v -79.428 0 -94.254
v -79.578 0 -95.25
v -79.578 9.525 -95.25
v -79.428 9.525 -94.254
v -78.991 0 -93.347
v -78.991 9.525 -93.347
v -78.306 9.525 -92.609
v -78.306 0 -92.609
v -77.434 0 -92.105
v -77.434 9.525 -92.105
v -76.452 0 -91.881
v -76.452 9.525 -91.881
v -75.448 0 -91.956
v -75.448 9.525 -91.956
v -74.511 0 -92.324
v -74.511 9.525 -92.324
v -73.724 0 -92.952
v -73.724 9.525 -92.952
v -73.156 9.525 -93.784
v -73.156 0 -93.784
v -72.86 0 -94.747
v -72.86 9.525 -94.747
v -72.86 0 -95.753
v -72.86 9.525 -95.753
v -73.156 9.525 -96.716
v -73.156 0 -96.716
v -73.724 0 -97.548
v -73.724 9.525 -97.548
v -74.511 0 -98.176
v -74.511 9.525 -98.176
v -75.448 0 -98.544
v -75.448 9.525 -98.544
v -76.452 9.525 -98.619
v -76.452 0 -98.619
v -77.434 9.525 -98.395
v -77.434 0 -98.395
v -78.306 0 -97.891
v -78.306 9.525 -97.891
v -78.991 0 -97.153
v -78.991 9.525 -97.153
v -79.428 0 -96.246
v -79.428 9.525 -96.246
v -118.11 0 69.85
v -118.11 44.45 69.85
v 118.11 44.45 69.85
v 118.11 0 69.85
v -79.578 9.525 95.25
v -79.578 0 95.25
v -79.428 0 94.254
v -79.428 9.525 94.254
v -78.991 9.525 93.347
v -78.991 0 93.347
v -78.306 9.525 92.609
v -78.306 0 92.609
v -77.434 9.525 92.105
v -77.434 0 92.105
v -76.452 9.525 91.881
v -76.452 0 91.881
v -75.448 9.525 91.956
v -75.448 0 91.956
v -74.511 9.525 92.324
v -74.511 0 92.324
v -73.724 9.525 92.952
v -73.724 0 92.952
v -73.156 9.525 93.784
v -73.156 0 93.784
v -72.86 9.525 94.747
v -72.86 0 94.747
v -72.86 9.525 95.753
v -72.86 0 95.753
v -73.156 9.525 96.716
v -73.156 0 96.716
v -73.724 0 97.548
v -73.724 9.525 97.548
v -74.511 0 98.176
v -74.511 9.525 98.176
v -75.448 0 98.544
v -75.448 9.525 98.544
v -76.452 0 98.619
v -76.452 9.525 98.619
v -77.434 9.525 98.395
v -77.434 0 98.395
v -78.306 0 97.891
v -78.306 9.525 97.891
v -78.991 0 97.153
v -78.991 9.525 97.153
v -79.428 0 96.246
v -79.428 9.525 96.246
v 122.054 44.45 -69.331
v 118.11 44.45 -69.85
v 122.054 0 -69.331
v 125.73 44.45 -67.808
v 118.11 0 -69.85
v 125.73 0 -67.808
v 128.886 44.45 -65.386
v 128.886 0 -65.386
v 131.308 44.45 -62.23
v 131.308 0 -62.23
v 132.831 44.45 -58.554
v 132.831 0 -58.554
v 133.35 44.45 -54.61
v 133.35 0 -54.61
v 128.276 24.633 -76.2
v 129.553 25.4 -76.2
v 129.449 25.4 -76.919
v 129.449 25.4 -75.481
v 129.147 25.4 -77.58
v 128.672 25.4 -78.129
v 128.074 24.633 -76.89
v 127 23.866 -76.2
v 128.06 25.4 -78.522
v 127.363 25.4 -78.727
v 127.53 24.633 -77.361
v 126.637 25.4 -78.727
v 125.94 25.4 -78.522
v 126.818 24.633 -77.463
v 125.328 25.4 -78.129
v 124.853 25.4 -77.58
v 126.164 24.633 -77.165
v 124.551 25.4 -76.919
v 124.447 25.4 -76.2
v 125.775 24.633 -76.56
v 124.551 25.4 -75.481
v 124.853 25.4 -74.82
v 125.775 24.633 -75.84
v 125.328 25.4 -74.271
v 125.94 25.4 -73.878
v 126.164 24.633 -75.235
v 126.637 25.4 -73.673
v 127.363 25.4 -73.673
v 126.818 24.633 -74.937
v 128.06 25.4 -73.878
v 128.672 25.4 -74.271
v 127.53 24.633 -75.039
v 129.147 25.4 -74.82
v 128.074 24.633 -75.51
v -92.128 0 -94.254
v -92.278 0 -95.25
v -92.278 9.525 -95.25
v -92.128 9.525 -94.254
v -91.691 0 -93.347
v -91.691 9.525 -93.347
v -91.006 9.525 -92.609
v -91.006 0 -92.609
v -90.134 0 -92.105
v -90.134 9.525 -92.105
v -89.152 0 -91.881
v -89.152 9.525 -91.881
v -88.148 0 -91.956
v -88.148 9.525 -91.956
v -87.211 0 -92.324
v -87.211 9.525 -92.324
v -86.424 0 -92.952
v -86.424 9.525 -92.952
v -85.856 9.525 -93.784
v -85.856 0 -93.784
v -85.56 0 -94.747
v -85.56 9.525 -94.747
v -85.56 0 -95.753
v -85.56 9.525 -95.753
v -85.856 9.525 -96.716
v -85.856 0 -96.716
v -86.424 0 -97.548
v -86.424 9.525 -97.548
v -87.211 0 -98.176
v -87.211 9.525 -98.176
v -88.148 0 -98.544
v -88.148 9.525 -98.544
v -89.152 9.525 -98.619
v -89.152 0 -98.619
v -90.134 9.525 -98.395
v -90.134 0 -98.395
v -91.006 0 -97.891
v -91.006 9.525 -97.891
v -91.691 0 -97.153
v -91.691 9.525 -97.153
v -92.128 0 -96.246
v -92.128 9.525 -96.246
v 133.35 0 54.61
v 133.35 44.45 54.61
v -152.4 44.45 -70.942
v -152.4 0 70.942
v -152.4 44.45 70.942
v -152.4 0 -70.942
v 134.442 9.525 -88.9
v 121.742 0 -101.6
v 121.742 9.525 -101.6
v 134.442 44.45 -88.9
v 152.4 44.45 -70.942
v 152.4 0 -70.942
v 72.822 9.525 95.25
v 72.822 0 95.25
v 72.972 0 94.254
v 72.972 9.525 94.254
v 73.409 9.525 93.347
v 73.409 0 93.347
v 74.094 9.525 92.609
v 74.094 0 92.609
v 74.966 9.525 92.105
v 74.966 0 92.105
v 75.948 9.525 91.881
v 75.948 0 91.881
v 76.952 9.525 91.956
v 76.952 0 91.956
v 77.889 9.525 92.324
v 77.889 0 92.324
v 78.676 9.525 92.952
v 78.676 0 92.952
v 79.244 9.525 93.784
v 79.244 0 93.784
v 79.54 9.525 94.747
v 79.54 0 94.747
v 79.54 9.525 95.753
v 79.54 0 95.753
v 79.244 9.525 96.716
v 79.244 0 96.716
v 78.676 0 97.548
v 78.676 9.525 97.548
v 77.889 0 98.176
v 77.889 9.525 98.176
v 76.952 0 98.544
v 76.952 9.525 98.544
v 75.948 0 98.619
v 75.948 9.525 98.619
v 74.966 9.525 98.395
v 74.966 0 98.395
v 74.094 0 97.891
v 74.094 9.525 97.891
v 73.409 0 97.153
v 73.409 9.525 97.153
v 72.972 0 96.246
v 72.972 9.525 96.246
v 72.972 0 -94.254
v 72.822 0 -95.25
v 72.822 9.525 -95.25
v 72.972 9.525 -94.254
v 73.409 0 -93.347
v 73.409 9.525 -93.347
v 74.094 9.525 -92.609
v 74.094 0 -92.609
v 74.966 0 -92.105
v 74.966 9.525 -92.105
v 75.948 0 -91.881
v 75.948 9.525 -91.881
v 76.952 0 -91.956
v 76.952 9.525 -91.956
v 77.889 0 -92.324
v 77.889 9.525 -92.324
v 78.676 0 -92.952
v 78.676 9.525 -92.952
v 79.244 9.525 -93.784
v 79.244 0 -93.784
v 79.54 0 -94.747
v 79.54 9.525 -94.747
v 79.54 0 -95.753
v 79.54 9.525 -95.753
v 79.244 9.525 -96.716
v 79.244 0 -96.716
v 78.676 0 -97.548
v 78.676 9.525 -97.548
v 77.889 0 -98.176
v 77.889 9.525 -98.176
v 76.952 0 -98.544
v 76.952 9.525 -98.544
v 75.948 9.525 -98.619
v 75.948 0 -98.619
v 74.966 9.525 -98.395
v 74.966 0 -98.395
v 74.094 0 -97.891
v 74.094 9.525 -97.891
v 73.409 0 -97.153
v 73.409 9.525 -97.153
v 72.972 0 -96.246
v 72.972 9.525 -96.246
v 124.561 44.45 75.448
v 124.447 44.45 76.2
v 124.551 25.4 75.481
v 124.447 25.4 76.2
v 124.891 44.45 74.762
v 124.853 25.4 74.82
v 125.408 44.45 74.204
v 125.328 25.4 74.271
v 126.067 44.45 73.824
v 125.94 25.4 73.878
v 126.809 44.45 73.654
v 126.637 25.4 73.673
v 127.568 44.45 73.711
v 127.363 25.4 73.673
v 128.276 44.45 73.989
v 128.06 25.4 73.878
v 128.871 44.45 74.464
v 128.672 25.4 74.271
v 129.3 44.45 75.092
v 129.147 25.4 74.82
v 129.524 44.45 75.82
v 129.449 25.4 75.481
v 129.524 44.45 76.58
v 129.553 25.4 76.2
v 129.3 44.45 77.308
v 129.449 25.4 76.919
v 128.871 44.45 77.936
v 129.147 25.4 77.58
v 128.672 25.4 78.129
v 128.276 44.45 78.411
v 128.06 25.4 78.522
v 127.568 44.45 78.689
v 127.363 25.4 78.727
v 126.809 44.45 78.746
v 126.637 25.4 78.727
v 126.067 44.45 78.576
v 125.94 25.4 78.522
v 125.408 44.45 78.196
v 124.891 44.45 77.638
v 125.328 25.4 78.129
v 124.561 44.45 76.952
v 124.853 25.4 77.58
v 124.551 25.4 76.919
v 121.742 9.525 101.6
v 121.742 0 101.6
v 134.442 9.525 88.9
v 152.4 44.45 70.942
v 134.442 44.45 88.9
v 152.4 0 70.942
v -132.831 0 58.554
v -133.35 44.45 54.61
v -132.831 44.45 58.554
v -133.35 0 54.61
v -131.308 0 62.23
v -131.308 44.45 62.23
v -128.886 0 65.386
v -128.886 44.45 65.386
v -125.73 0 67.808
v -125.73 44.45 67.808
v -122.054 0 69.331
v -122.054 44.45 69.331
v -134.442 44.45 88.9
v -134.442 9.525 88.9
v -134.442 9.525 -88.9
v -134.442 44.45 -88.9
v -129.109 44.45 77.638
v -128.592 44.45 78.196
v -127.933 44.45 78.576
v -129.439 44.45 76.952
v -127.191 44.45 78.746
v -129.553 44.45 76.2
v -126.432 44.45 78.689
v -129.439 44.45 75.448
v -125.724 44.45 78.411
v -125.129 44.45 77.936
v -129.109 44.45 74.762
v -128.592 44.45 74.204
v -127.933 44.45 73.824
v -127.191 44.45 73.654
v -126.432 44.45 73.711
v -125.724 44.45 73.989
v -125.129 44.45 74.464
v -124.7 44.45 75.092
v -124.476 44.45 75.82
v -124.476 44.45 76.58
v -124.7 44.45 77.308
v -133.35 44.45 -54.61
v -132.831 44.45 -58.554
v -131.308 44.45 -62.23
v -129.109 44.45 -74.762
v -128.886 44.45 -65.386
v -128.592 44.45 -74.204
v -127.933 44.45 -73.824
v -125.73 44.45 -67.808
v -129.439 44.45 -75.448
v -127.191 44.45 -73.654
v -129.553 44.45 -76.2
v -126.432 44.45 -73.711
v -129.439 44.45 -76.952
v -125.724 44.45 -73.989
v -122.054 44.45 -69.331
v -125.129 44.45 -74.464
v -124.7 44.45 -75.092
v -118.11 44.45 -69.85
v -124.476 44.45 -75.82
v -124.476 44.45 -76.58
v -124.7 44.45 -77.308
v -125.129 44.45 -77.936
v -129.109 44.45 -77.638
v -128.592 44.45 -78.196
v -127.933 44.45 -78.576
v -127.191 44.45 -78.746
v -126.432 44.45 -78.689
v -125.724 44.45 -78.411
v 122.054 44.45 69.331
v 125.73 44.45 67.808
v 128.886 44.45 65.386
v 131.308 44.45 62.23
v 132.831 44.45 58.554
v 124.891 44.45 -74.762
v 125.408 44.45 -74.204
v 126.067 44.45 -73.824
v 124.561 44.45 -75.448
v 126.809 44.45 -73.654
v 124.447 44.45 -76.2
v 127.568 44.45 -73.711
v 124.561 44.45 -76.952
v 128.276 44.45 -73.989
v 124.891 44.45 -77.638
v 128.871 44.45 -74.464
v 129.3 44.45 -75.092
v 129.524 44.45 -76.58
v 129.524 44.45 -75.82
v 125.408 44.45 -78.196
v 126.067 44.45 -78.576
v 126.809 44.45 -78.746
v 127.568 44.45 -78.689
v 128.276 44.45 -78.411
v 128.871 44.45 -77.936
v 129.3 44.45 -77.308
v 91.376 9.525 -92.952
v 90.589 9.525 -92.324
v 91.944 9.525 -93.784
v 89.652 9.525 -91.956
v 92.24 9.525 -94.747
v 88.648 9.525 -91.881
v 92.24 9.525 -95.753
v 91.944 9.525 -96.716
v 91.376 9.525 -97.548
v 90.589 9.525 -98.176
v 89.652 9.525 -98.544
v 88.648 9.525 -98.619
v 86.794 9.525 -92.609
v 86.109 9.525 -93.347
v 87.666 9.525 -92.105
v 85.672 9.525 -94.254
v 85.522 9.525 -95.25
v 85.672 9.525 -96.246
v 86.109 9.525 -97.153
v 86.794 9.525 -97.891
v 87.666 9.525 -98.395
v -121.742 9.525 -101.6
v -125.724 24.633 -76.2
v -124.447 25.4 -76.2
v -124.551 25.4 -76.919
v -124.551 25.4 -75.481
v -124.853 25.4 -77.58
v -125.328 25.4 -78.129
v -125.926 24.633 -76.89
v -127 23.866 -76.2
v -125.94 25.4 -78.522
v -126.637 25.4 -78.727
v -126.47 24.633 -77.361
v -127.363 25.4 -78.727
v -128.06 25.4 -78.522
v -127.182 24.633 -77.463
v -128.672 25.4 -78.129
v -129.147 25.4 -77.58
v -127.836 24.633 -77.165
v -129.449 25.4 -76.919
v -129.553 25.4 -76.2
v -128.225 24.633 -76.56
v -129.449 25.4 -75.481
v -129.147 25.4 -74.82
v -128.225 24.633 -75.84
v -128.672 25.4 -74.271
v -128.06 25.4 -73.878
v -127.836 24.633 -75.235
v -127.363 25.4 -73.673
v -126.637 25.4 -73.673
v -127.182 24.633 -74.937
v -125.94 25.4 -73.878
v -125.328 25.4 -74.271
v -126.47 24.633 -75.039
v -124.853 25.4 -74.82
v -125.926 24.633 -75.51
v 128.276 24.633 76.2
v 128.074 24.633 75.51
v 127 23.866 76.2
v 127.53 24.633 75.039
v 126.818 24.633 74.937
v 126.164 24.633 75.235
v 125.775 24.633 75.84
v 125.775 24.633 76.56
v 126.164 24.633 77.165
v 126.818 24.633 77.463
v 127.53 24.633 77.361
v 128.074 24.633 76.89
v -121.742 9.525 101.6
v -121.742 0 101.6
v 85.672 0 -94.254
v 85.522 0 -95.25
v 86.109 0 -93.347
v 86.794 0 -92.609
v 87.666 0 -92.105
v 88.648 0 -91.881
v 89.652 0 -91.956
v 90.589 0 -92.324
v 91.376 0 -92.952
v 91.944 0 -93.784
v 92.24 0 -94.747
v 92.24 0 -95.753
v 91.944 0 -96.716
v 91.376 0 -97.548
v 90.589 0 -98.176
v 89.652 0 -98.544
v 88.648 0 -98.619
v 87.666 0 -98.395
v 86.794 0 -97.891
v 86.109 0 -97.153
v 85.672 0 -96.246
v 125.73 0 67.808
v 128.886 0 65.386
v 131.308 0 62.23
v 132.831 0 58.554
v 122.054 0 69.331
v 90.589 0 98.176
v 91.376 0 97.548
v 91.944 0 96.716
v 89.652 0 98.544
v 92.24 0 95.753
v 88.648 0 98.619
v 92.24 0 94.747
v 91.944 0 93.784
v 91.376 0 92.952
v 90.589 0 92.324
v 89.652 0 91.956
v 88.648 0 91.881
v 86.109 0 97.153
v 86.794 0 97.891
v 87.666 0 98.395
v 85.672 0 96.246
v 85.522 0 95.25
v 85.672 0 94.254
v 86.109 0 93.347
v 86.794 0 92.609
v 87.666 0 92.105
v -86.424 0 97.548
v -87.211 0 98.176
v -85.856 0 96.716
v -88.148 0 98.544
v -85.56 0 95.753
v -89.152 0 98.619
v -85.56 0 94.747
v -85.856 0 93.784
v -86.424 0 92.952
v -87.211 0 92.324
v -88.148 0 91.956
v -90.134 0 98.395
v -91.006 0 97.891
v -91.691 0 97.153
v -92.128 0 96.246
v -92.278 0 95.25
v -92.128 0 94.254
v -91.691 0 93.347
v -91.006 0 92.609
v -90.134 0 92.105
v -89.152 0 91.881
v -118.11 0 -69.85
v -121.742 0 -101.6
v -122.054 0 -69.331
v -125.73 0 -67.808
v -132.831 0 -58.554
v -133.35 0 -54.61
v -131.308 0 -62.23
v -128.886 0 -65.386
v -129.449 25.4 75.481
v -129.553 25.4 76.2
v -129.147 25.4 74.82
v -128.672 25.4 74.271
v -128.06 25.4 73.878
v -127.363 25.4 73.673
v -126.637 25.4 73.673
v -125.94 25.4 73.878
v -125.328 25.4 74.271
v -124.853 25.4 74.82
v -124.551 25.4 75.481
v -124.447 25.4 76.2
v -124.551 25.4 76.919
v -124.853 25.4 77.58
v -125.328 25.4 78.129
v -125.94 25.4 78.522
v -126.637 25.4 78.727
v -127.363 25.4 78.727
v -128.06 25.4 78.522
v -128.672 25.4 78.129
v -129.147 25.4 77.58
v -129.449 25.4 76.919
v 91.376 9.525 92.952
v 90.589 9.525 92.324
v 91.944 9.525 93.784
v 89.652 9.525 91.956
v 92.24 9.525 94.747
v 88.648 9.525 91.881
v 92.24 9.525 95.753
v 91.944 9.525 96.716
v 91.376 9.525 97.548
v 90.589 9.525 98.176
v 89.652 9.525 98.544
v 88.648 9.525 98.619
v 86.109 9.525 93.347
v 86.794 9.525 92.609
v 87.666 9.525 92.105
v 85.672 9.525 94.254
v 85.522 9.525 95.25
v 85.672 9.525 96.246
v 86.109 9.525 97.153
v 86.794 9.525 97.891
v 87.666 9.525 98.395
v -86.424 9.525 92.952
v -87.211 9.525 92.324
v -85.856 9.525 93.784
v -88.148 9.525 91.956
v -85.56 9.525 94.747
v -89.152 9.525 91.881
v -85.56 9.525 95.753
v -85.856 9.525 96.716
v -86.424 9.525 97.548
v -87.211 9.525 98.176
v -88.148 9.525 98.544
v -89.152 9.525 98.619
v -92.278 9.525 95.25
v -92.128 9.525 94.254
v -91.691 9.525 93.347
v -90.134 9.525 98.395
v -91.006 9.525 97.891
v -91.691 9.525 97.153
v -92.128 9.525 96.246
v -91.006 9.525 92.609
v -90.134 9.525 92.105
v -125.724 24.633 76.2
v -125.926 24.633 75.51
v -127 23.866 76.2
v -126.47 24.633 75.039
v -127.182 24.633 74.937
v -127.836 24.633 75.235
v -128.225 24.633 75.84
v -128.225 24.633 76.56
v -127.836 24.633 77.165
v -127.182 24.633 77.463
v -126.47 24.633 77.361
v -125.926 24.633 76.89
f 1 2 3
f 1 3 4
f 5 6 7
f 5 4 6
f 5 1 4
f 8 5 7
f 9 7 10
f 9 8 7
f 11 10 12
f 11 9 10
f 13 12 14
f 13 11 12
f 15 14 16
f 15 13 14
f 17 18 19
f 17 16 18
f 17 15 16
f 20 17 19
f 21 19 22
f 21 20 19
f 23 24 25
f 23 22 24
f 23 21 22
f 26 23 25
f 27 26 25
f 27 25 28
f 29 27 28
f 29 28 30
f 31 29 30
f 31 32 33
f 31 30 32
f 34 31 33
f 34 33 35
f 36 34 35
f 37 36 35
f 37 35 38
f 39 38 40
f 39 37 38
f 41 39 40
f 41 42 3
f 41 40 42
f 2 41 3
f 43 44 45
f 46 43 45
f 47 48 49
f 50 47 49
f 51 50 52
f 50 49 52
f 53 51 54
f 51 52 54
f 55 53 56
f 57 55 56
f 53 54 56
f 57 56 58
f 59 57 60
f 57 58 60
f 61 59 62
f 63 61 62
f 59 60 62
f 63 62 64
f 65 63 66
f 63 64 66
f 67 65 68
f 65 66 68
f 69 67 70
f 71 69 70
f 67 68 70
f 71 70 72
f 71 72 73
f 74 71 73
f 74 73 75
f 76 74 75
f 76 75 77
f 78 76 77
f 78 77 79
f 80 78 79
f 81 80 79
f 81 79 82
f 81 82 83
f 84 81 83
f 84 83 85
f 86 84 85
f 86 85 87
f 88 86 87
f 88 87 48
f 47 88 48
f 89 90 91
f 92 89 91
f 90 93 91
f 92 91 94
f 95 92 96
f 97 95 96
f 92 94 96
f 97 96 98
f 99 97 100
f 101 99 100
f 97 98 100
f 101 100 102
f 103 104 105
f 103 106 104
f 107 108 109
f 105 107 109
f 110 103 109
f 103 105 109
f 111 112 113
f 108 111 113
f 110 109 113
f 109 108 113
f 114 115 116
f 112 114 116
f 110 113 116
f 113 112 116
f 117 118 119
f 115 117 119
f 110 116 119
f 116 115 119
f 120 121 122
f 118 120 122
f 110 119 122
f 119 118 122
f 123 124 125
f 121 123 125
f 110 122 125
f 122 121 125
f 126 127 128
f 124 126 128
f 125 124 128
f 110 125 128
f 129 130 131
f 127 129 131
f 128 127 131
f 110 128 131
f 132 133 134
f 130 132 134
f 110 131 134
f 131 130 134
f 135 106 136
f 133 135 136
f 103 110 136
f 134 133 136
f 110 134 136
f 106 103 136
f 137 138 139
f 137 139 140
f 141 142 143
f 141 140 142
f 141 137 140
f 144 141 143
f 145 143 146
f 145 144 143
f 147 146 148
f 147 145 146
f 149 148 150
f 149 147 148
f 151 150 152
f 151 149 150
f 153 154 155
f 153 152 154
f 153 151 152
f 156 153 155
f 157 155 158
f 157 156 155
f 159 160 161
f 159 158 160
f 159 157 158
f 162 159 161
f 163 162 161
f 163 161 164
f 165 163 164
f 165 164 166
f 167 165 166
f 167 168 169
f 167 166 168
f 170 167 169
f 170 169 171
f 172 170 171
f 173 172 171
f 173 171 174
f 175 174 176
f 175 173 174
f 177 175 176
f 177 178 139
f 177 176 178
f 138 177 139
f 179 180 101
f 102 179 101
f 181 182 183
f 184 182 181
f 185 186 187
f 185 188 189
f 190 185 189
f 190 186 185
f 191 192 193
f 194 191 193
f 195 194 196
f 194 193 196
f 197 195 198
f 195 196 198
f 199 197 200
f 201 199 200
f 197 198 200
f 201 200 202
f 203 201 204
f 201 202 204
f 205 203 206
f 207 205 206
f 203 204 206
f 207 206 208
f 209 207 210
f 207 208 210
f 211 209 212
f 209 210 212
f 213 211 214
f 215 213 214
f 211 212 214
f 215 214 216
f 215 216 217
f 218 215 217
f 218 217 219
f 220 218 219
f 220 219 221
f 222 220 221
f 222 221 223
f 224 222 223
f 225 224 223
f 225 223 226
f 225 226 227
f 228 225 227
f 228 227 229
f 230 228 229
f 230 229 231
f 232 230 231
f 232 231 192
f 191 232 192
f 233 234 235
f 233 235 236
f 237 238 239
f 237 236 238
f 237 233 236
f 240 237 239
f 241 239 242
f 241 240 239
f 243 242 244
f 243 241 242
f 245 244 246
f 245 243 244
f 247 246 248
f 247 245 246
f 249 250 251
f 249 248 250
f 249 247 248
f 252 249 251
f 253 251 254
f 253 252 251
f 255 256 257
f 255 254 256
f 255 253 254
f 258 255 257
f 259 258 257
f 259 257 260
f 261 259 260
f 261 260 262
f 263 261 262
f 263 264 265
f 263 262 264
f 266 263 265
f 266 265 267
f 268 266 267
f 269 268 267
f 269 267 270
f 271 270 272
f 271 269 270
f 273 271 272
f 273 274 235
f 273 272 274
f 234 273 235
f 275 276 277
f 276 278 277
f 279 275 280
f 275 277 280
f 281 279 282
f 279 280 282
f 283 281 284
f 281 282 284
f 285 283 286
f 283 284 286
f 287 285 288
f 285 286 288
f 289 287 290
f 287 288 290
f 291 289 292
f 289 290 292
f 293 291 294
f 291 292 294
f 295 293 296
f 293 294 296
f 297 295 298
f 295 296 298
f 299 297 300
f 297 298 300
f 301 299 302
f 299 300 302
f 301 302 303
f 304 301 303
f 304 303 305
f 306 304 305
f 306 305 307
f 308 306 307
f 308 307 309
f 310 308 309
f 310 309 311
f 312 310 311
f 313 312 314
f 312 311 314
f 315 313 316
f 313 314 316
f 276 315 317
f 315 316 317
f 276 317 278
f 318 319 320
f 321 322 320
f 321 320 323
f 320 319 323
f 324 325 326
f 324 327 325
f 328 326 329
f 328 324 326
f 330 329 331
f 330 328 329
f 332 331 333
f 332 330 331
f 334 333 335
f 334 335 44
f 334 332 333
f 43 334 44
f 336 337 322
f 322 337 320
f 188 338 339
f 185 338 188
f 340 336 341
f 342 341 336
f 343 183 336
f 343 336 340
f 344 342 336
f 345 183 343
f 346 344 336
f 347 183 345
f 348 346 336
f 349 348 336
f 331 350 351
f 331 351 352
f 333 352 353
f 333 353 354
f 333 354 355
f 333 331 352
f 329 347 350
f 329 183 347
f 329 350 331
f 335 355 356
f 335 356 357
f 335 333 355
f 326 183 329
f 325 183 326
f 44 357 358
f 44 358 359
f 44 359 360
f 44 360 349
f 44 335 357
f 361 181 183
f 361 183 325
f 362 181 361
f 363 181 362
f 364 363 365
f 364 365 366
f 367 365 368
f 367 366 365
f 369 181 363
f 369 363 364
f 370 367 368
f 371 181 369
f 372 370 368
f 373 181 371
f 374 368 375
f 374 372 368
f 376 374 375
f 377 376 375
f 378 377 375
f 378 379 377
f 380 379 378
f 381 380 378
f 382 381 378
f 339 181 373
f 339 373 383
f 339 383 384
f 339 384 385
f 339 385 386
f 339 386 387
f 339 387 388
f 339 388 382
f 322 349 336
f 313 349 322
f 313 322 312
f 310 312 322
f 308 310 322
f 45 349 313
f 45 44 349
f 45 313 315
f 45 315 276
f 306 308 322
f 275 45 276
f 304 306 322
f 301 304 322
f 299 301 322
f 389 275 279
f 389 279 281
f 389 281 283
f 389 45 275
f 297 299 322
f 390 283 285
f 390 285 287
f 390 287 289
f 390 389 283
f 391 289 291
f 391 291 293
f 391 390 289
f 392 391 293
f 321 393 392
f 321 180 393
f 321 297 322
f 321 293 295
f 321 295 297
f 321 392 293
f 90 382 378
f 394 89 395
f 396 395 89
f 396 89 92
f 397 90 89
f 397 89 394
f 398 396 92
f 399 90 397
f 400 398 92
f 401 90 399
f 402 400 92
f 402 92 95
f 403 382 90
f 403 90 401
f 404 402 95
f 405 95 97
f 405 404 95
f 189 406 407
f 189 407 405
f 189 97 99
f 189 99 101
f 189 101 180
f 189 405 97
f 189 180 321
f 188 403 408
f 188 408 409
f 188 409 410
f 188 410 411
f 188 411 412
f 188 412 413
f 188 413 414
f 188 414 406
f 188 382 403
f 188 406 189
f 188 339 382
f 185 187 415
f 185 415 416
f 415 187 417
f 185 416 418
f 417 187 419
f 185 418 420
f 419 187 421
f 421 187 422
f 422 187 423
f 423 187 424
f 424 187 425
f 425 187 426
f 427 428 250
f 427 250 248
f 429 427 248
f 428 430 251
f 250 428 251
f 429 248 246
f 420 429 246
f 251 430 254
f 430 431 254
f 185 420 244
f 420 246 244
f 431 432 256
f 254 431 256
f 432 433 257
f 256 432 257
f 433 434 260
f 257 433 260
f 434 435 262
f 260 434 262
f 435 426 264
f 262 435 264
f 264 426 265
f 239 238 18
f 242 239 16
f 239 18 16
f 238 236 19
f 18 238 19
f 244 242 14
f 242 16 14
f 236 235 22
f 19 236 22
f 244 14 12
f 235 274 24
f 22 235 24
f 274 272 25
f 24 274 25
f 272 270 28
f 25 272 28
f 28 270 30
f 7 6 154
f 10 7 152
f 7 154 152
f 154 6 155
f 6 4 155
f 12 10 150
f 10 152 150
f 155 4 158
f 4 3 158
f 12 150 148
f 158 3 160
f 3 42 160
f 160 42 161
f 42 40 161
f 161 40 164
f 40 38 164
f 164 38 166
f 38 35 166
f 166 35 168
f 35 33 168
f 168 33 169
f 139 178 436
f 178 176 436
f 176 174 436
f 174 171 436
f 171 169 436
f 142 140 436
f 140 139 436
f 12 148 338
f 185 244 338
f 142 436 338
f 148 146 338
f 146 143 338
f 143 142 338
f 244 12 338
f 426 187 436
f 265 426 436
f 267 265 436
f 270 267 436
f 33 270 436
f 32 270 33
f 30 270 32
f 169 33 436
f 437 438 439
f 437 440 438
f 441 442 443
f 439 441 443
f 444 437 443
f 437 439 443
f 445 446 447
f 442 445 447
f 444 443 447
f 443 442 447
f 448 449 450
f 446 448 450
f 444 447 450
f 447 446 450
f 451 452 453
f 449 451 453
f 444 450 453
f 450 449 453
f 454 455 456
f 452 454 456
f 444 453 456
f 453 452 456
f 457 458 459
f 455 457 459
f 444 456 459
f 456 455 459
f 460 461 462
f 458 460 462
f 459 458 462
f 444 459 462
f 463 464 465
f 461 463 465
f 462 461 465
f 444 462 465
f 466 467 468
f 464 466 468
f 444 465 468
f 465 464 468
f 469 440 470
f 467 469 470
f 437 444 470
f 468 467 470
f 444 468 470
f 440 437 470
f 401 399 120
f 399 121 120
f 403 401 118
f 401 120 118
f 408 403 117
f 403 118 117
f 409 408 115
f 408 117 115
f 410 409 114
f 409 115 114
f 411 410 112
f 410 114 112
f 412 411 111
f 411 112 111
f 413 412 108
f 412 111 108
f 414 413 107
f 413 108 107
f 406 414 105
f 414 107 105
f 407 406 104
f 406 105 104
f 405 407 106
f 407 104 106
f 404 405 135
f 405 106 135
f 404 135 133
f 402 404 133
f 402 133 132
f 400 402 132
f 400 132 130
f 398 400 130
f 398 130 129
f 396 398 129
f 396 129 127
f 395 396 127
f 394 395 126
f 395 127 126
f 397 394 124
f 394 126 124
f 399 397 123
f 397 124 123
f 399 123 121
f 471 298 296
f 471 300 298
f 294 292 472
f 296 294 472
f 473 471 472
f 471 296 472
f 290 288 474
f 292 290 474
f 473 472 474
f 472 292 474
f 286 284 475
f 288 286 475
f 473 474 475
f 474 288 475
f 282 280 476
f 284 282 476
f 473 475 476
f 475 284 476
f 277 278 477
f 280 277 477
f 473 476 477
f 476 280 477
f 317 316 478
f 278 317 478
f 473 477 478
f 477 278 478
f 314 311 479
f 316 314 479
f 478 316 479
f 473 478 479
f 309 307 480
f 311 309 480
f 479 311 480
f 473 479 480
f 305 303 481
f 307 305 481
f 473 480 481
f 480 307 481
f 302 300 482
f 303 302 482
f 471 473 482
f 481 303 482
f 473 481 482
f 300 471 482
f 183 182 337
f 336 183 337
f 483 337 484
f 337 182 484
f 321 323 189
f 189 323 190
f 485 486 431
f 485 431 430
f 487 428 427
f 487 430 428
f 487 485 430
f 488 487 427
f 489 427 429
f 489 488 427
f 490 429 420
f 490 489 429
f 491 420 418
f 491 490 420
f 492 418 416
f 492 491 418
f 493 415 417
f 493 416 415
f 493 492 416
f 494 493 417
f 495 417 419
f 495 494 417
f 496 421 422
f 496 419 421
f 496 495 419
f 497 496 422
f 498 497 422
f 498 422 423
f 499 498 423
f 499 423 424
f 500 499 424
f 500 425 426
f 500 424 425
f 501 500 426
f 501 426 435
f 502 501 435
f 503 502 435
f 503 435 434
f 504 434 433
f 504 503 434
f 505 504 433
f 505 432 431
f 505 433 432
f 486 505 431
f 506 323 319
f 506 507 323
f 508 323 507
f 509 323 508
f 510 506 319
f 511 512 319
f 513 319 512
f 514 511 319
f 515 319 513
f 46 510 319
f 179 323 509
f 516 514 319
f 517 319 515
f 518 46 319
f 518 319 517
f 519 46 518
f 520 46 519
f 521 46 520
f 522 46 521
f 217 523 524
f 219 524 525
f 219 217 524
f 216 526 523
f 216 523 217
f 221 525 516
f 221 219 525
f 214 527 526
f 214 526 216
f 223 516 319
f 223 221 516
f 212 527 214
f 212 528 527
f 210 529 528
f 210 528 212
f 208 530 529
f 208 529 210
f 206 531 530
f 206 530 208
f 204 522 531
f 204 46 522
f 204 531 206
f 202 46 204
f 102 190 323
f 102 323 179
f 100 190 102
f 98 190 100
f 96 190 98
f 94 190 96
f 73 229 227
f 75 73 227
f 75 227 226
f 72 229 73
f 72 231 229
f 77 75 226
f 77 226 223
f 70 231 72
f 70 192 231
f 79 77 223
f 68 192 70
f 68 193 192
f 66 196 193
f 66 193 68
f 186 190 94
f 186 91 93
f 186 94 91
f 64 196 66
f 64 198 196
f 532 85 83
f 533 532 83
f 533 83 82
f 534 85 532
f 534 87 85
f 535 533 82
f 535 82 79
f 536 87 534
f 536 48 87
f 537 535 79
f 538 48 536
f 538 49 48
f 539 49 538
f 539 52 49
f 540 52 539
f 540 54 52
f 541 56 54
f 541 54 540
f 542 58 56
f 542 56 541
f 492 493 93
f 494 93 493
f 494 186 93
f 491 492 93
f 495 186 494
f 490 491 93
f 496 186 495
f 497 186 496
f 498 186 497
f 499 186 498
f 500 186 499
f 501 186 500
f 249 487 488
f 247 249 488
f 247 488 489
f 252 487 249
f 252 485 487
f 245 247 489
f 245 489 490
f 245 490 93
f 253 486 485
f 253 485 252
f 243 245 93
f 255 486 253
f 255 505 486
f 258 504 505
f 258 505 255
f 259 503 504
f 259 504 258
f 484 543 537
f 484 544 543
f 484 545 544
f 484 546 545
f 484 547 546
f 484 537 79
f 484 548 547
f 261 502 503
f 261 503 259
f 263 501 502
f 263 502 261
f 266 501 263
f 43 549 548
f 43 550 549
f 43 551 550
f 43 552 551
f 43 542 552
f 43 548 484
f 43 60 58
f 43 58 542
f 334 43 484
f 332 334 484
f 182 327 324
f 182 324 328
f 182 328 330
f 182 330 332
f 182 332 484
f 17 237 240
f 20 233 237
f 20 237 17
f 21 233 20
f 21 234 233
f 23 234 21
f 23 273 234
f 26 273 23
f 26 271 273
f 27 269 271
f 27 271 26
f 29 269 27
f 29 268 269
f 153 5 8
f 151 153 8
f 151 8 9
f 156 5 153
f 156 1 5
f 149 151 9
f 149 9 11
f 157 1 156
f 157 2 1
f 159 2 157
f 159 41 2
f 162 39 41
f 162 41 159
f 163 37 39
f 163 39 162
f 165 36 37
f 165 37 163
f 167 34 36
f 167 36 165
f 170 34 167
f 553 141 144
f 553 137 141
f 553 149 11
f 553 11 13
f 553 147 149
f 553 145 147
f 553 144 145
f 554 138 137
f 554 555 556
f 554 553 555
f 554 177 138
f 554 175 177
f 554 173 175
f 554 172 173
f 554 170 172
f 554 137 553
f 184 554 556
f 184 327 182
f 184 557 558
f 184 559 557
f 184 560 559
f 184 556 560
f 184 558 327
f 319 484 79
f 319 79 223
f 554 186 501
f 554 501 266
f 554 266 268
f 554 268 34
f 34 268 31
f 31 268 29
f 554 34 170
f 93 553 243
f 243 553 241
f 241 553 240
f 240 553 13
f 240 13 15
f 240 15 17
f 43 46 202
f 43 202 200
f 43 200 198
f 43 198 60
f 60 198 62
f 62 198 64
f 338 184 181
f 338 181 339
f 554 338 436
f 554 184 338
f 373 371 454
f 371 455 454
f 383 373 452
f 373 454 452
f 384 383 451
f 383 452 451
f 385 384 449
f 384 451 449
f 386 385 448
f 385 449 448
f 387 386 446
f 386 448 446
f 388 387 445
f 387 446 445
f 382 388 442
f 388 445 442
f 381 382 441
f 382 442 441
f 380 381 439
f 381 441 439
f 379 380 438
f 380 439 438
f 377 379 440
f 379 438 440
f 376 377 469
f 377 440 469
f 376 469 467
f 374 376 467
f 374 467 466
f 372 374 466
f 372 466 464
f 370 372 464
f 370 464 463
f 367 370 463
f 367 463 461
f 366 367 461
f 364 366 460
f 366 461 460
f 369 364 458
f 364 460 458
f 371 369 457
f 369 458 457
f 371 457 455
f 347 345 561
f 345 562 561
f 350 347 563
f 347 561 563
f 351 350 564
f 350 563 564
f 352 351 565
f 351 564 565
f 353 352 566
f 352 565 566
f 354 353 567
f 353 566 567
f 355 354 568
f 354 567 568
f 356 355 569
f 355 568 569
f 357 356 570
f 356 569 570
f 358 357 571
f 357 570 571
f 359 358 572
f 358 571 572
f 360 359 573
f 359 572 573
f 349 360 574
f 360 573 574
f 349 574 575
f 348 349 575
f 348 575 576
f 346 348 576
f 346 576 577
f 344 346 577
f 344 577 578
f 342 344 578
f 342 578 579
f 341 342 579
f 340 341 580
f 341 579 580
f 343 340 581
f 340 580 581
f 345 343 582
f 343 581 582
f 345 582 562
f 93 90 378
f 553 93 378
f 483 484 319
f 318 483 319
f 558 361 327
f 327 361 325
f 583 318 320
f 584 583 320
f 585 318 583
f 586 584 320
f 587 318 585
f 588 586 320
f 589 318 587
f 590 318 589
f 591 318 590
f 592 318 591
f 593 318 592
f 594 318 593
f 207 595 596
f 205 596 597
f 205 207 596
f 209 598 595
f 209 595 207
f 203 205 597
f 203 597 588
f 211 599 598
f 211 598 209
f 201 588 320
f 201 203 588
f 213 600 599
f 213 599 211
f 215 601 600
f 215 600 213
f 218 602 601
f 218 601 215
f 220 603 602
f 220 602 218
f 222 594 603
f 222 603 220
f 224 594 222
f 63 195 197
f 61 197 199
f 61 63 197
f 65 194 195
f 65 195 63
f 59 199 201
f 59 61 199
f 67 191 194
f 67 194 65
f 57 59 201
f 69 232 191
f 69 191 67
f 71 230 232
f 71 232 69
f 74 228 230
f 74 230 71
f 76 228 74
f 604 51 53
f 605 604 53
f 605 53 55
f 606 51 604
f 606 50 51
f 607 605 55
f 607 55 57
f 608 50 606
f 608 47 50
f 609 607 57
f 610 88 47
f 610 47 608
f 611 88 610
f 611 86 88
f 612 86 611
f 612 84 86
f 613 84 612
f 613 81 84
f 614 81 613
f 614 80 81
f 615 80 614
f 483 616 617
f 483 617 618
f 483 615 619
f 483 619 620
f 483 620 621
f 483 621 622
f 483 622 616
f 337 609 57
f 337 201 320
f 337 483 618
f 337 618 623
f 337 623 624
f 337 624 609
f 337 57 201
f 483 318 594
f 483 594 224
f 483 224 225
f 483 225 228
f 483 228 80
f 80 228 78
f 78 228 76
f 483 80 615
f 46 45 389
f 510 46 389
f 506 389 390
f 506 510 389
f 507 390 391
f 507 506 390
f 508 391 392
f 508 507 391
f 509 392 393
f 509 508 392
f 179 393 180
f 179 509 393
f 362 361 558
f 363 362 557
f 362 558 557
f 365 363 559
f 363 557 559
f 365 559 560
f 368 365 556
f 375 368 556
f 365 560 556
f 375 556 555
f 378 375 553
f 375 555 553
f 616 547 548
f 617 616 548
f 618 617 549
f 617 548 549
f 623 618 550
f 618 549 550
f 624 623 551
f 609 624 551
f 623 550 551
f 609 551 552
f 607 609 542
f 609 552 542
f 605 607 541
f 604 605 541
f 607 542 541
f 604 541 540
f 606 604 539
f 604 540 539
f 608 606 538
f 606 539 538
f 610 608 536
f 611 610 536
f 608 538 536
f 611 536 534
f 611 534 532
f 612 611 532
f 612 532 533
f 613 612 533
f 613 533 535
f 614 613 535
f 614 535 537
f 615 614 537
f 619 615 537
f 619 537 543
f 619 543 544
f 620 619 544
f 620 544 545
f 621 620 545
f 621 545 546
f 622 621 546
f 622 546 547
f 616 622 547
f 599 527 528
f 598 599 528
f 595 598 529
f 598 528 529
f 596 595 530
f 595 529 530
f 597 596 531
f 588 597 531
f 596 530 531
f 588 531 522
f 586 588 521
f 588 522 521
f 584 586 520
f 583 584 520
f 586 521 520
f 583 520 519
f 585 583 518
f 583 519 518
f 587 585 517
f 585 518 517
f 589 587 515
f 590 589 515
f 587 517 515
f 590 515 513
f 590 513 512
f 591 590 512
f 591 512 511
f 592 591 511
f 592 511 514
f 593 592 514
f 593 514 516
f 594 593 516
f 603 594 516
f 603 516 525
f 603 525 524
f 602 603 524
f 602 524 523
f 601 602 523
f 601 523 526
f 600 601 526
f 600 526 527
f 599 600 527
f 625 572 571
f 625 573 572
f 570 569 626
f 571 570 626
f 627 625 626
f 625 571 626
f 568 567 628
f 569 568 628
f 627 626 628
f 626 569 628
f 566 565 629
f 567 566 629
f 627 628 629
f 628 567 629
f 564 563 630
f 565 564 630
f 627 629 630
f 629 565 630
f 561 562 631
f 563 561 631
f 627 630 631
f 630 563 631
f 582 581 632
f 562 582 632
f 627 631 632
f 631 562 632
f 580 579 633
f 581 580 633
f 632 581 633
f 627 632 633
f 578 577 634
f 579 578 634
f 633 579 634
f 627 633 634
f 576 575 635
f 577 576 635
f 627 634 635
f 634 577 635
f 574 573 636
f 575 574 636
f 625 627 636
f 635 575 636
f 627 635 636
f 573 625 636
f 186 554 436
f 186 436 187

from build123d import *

# Parameters (mm, degrees)
SKETCH1_W                   = 304.8
SKETCH1_H                   = 177.8
BOSS_EXTRUDE1_DEPTH         = 44.45
CHAMFER1_SIZE               = 17.9578
CUT_EXTRUDE1_DEPTH          = 45.45
F_1_4_20_TAPPED_HOLE1_D     = 5.1054
F_1_4_20_TAPPED_HOLE1_DEPTH = 19.05
F_1_4_20_TAPPED_HOLE1_TIP   = 1.533816902
BOSS_EXTRUDE2_DEPTH         = 9.525
F_1_4_CLEARANCE_HOLE1_D     = 6.7564
FILLET2_R                   = 15.24


with BuildPart() as part:
    # Sketch1 → Boss-Extrude1 (new body)
    with BuildSketch(Plane(origin=(0, 0, 0), x_dir=(1, 0, 0), z_dir=(0, 1, 0))):
        Rectangle(SKETCH1_W, SKETCH1_H)
    extrude(amount=BOSS_EXTRUDE1_DEPTH)

    # Chamfer1
    chamfer1_edges = [part.edges().sort_by_distance(p)[0] for p in [
        (-152.4, 22.225, -88.9),
        (152.4, 22.225, -88.9),
        (152.4, 22.225, 88.9),
        (-152.4, 22.225, 88.9),
    ]]
    chamfer(chamfer1_edges, length=CHAMFER1_SIZE)

    # Sketch3 → Cut-Extrude1 (cut, through all)
    with BuildSketch(Plane(origin=(0, 44.45, 0), x_dir=(1, 0, 0), z_dir=(0, 1, 0))):
        Polygon((133.35, 63.051431637), (126.551431637, 69.85), (-126.551431637, 69.85), (-133.35, 63.051431637), (-133.35, -63.051431637), (-126.551431637, -69.85), (126.551431637, -69.85), (133.35, -63.051431637), align=None)
        Polygon((-133.35, 63.051431637), (-126.551431637, 69.85), (-133.35, 69.85), align=None)
        Polygon((133.35, 69.85), (126.551431637, 69.85), (133.35, 63.051431637), align=None)
        Polygon((-126.551431637, -69.85), (-133.35, -63.051431637), (-133.35, -69.85), align=None)
        Polygon((133.35, -69.85), (133.35, -63.051431637), (126.551431637, -69.85), align=None)
    extrude(amount=-CUT_EXTRUDE1_DEPTH, mode=Mode.SUBTRACT)

    # 1/4-20 Tapped Hole1
    with Locations(Plane(origin=(0, 44.45, 0), x_dir=(1, 0, 0), z_dir=(0, 1, 0))):
        with Locations((-127, 76.2), (127, 76.2), (127, -76.2), (-127, -76.2)):
            Hole(F_1_4_20_TAPPED_HOLE1_D / 2, depth=F_1_4_20_TAPPED_HOLE1_DEPTH)
            with Locations((0, 0, -(F_1_4_20_TAPPED_HOLE1_DEPTH + F_1_4_20_TAPPED_HOLE1_TIP / 2))):  # 118° drill point
                Cone(0, F_1_4_20_TAPPED_HOLE1_D / 2, F_1_4_20_TAPPED_HOLE1_TIP, mode=Mode.SUBTRACT)

    # Sketch6 → Boss-Extrude2 (add)
    with BuildSketch(Plane.XZ):
        Polygon((121.7422, 101.6), (134.4422, 88.9), (-134.4422, 88.9), (-121.7422, 101.6), align=None)
    boss_extrude2 = extrude(amount=-BOSS_EXTRUDE2_DEPTH)

    # 1/4 Clearance Hole1 (through all)
    with Locations(Plane(origin=(0, 9.525, 0), x_dir=(1, 0, 0), z_dir=(0, 1, 0))):
        with Locations((-88.9, -95.25), (88.9, -95.25), (-76.2, -95.25), (76.2, -95.25)):
            f_1_4_clearance_hole1 = Hole(F_1_4_CLEARANCE_HOLE1_D / 2)

    # Mirror1: Boss-Extrude2, 1/4 Clearance Hole1 across plane
    add(boss_extrude2.mirror(Plane.XY))
    add(f_1_4_clearance_hole1.mirror(Plane.XY), mode=Mode.SUBTRACT)

    # Fillet2
    fillet2_edges = [part.edges().sort_by_distance(p)[0] for p in [
        (133.35, 22.225, -69.85),
        (133.35, 22.225, 69.85),
        (-133.35, 22.225, 69.85),
        (-133.35, 22.225, -69.85),
    ]]
    fillet(fillet2_edges, radius=FILLET2_R)


solid = part.part
